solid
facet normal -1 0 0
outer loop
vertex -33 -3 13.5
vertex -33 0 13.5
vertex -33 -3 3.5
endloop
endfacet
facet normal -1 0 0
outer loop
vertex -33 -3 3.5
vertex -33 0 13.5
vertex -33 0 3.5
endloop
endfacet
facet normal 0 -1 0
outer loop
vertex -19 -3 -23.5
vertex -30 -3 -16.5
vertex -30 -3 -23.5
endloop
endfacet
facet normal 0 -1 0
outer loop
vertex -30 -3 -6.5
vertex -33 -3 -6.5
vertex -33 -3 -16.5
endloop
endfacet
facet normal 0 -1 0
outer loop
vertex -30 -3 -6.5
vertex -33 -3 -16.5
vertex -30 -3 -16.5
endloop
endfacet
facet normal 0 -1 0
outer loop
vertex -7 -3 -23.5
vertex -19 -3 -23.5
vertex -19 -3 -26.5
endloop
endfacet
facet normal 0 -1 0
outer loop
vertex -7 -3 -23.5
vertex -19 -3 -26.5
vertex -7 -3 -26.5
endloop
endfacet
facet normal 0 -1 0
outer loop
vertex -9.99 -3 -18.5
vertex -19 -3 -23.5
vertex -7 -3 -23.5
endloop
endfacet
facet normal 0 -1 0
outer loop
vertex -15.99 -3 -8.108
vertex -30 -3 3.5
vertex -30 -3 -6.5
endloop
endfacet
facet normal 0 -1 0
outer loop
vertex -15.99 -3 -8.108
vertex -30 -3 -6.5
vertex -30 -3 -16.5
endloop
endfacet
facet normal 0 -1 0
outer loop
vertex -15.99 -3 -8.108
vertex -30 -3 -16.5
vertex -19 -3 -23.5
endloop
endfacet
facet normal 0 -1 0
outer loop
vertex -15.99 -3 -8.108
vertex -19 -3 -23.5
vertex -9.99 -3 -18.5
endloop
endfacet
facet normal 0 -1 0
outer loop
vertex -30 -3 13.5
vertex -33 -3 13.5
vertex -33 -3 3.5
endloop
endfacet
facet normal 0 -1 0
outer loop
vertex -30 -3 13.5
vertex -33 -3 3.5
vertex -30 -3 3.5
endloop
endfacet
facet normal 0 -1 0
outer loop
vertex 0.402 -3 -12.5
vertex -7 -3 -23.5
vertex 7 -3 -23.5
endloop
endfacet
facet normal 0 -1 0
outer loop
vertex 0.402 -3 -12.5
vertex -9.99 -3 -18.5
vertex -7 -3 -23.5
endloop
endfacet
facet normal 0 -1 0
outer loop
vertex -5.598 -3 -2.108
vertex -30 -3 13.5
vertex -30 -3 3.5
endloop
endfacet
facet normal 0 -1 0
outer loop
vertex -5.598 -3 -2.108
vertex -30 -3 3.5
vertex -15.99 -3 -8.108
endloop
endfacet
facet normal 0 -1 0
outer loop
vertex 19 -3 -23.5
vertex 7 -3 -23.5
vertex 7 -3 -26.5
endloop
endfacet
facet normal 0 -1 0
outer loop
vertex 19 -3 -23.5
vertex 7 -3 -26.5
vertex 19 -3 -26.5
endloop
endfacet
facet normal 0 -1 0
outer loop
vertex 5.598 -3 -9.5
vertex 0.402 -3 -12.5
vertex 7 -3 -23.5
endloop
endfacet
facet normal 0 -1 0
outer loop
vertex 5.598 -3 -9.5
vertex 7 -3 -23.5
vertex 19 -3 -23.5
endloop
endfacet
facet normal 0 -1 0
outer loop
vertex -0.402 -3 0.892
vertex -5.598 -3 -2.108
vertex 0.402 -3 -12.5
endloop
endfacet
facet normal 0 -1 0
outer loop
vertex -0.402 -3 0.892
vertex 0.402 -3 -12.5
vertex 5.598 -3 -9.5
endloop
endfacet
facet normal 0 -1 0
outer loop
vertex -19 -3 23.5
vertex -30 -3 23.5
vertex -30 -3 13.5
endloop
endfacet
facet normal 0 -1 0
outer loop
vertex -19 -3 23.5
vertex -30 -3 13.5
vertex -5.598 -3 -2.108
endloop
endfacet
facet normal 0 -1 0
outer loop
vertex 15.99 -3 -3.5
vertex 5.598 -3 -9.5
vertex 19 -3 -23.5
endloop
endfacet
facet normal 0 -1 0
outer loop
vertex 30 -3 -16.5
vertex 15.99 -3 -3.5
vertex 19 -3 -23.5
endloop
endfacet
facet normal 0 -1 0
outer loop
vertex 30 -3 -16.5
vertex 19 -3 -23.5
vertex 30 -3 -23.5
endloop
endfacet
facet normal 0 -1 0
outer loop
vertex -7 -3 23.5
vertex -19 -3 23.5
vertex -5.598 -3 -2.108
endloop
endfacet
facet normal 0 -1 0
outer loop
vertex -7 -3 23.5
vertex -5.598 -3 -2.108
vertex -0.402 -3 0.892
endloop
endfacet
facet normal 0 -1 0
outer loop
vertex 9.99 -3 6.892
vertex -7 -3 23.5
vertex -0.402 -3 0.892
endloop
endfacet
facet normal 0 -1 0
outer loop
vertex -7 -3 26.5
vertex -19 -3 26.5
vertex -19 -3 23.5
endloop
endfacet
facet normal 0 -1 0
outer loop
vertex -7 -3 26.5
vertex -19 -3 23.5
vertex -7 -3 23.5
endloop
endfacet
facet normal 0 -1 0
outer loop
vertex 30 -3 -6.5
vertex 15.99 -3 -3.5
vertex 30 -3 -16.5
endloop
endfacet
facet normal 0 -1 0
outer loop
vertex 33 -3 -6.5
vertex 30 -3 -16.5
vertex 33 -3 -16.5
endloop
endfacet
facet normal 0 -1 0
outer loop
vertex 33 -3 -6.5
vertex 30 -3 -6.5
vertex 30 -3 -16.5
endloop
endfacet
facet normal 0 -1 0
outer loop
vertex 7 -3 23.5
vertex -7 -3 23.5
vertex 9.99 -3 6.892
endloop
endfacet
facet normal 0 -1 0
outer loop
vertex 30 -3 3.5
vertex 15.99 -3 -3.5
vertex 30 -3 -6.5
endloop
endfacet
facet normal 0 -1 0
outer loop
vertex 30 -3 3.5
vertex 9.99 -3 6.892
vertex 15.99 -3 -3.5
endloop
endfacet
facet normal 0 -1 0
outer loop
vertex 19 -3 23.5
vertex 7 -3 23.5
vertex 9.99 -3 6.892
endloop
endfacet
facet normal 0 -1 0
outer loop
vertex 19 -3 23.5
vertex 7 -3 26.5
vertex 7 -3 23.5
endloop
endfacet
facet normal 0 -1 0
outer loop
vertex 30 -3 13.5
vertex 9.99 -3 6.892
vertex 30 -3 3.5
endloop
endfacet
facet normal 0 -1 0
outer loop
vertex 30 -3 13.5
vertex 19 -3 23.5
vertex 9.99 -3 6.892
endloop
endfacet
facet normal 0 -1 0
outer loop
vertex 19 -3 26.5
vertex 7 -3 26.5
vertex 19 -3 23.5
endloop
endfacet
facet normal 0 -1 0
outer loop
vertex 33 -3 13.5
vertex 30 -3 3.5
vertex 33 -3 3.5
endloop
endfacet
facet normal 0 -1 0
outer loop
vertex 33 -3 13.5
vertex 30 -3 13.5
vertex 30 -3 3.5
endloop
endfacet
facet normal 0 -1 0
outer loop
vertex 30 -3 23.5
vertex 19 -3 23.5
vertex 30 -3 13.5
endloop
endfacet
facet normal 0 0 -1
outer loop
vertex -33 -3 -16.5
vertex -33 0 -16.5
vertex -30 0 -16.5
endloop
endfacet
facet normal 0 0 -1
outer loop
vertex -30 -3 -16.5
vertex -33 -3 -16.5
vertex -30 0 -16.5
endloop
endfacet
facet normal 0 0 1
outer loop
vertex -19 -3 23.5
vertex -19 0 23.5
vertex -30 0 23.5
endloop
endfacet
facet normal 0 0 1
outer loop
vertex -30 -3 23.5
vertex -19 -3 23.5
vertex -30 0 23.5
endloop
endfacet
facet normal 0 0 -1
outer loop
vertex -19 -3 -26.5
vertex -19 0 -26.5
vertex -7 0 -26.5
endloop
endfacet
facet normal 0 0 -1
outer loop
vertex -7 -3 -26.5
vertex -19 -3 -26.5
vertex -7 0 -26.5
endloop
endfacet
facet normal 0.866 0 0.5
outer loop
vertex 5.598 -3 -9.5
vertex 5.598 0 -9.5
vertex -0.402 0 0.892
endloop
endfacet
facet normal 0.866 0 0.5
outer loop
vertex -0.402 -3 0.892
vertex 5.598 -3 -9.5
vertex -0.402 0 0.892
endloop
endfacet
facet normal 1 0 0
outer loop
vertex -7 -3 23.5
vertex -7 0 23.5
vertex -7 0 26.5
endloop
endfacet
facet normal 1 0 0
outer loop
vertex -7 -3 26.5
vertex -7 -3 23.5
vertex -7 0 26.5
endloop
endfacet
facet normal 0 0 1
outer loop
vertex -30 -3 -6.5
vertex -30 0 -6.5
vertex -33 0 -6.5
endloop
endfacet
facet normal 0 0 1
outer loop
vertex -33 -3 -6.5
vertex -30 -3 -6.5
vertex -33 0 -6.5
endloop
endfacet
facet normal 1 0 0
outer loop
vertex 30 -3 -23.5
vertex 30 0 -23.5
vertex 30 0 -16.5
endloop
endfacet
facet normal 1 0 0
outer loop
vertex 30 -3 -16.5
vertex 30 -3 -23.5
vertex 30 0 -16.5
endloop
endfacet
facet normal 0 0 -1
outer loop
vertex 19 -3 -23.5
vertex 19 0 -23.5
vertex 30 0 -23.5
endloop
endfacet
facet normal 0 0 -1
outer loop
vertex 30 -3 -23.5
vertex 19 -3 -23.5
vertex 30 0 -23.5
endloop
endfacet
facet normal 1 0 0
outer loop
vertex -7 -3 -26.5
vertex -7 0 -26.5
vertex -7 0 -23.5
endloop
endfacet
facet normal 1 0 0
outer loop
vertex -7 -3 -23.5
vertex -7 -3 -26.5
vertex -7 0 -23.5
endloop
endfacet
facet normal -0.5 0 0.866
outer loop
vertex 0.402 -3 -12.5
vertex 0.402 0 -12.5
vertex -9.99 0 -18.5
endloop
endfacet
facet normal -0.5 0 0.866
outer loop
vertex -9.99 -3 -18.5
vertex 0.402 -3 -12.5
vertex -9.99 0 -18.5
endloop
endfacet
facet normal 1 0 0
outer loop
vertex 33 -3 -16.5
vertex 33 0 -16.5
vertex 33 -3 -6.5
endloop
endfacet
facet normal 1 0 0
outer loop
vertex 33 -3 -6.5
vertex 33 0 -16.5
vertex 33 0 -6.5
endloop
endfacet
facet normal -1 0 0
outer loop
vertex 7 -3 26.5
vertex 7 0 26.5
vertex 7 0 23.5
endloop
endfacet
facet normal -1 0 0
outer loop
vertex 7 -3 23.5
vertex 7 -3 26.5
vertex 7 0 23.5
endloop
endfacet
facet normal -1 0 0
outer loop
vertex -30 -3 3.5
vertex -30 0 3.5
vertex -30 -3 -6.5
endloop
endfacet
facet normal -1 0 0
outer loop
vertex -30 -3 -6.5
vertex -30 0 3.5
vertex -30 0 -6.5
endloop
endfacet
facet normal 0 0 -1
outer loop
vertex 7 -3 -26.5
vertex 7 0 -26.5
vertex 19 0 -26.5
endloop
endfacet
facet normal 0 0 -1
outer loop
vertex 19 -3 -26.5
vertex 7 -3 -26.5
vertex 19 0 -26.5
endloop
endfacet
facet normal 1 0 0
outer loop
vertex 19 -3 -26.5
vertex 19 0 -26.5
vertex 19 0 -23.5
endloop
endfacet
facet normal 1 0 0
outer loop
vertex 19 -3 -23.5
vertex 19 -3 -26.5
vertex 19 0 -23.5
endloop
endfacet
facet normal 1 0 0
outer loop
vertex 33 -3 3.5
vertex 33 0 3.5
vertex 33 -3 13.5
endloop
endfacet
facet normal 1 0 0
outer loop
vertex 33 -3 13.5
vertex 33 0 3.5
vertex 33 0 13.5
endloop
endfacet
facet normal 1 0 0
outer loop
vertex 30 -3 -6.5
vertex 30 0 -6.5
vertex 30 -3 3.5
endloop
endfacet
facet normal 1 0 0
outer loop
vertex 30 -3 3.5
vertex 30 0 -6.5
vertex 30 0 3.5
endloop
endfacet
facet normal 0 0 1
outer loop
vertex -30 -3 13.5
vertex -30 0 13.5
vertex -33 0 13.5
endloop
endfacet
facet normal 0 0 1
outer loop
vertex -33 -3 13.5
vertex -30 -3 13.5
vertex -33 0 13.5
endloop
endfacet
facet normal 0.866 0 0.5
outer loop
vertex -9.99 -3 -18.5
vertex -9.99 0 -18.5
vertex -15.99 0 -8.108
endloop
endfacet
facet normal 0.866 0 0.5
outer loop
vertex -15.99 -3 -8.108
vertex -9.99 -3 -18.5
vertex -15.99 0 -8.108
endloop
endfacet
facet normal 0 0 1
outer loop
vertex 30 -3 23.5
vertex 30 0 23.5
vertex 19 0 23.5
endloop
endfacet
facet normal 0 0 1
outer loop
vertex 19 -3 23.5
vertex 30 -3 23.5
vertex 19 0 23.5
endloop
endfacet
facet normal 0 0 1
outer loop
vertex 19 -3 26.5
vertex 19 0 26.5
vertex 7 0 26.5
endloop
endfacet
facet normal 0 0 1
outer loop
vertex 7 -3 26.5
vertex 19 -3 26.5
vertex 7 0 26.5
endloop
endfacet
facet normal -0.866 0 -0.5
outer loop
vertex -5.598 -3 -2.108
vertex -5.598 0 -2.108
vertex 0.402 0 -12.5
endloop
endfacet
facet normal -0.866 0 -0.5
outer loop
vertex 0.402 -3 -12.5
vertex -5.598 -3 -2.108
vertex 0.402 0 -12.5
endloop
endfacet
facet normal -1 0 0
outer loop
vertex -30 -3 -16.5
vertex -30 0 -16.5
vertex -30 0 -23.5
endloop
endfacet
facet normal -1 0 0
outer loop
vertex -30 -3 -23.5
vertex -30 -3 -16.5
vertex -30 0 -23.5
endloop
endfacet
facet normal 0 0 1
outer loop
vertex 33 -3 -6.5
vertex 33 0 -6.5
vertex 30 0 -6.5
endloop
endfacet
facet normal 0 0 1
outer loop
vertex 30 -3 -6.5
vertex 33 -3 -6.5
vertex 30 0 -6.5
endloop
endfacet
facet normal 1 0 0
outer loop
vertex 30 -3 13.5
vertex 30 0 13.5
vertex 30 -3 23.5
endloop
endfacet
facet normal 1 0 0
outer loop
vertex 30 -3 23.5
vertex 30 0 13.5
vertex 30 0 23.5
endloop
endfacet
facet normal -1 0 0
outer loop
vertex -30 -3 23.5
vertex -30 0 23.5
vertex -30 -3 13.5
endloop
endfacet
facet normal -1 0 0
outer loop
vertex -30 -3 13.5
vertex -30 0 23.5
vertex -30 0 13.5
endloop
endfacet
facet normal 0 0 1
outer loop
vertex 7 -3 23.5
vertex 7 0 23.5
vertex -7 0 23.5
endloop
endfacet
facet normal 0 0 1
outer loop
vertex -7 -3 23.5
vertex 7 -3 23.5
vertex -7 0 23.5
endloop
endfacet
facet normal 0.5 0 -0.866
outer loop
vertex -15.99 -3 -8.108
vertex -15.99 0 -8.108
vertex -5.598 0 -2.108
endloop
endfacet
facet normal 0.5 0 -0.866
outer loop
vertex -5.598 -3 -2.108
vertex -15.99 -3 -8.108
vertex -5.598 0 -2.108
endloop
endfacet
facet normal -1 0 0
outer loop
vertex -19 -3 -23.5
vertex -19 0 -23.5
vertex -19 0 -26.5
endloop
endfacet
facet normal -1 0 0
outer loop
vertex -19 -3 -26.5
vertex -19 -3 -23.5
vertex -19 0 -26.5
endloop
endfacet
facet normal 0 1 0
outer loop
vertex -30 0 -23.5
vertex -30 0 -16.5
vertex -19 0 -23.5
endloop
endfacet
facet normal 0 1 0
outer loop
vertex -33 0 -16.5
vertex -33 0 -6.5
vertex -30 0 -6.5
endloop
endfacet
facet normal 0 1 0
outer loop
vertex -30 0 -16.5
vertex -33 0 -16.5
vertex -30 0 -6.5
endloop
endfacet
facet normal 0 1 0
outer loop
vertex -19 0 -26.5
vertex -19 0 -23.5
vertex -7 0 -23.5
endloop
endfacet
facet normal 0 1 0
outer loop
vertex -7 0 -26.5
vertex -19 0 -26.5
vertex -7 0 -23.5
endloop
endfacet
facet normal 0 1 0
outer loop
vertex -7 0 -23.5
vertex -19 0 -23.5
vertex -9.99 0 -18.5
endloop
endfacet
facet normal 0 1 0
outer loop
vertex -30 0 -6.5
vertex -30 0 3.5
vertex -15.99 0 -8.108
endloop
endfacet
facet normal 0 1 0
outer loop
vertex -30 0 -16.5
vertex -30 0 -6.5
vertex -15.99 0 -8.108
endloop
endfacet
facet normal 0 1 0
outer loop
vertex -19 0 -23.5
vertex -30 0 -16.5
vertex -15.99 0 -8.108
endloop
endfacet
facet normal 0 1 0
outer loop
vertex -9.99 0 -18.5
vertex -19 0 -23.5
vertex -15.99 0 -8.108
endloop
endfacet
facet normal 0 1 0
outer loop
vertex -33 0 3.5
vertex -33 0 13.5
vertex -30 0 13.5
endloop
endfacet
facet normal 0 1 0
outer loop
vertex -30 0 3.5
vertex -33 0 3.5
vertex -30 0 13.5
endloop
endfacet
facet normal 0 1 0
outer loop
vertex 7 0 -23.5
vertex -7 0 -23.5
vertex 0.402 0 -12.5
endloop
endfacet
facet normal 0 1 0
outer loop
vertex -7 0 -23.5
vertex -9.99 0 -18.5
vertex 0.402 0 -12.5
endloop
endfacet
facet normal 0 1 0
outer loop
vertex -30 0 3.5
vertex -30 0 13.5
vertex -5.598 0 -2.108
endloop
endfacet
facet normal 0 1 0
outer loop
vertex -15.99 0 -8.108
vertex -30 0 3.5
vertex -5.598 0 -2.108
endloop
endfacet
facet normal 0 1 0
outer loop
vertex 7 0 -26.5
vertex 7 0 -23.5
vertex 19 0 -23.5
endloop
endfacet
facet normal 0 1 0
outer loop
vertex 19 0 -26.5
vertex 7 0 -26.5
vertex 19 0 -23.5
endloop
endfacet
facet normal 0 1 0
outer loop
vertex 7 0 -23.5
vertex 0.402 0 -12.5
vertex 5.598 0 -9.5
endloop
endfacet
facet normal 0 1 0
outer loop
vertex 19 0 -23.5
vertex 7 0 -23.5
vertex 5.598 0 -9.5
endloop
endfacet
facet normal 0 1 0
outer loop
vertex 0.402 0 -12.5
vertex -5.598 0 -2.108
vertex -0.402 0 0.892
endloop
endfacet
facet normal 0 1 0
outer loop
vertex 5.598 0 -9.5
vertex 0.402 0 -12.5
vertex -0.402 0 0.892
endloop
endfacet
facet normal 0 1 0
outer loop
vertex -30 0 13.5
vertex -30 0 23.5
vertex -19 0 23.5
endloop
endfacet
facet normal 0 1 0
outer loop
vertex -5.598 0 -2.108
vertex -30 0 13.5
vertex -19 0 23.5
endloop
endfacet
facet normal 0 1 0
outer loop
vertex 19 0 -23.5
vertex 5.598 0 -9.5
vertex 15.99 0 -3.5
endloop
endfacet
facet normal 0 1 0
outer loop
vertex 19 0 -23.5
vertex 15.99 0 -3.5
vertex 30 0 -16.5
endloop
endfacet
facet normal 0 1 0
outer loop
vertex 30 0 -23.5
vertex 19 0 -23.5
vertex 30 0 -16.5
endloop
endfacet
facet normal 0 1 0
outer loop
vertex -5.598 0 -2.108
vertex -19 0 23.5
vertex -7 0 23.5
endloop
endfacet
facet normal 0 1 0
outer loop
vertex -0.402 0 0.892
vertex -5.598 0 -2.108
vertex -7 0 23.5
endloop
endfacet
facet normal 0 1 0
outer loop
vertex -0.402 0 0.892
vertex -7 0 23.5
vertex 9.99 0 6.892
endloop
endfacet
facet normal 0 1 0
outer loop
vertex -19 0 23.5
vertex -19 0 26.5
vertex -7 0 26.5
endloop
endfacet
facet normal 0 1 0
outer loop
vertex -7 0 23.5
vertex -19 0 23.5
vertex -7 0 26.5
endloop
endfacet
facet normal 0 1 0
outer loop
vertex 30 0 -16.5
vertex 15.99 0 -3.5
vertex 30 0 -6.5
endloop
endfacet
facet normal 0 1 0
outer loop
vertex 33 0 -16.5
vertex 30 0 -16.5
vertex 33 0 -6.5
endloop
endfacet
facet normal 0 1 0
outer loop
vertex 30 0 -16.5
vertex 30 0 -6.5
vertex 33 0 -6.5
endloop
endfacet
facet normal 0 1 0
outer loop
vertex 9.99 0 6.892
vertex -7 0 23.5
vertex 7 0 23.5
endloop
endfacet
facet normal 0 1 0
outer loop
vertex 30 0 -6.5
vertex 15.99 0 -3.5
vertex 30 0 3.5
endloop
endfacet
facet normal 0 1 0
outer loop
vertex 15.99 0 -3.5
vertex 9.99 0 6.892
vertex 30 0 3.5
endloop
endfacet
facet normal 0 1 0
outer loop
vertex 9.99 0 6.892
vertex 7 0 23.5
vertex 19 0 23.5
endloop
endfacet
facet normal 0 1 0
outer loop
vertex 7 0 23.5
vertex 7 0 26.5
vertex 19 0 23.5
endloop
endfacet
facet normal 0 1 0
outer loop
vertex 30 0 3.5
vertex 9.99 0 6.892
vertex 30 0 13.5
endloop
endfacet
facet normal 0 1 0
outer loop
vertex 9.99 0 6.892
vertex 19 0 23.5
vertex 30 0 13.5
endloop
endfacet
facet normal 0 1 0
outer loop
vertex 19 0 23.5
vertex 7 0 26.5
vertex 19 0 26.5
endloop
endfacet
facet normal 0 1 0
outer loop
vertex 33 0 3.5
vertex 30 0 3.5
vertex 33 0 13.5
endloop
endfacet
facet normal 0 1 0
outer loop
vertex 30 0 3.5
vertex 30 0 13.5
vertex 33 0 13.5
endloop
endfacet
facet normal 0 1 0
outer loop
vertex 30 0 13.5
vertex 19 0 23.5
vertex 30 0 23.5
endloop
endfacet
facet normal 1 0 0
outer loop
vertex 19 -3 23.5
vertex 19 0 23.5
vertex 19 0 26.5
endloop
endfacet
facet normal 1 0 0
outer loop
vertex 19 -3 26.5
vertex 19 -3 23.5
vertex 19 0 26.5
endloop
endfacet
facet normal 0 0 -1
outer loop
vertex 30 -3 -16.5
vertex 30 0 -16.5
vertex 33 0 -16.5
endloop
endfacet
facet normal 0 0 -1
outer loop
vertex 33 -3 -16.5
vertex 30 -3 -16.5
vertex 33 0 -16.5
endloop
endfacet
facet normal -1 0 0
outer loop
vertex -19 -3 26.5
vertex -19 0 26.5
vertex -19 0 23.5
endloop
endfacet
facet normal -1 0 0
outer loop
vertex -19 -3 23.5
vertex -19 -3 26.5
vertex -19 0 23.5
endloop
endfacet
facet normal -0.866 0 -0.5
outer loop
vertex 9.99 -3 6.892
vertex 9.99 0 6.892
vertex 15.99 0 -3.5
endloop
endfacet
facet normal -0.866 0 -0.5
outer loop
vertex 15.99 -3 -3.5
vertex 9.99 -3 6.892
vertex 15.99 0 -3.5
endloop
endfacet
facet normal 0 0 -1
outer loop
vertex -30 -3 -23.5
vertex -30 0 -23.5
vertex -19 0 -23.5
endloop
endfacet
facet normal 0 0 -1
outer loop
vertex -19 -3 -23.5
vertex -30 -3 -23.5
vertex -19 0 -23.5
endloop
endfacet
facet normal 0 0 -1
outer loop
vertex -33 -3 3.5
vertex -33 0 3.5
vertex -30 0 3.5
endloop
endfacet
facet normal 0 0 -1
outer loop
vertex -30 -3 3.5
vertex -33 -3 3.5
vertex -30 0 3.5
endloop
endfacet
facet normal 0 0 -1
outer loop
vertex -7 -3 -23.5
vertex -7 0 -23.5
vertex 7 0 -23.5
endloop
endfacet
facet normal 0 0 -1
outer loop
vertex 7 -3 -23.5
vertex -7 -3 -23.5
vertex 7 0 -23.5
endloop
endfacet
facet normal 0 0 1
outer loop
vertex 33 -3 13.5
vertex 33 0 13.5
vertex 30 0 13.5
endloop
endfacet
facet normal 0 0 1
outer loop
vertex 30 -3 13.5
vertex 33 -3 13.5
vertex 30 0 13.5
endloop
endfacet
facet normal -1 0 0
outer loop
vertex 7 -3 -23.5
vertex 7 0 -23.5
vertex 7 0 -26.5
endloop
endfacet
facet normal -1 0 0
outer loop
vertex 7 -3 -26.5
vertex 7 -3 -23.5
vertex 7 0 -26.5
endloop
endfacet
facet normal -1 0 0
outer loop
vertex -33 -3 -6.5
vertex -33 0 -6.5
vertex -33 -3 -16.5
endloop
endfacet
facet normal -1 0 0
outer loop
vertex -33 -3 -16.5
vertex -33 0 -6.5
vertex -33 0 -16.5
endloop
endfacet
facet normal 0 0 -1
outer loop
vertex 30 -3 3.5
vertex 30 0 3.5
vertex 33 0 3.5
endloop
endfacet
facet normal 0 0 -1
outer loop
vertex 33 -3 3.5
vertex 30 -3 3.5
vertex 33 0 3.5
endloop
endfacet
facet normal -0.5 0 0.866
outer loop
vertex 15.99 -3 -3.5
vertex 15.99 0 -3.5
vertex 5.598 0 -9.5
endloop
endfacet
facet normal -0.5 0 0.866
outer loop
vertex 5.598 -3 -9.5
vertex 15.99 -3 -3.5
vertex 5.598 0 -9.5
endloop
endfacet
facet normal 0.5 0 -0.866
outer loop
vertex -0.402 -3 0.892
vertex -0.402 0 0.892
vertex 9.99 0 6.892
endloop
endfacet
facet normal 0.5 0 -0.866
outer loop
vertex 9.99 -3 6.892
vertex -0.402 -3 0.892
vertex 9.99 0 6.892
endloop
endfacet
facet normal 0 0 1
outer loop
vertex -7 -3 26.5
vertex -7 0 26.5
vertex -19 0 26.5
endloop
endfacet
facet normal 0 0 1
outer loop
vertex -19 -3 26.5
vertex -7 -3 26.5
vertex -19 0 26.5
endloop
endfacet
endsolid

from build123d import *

# Parameters (mm, degrees)
F1_DEPTH = 3


# Not quite as in the source:
# - a feature names something its author has since deleted; it is built from what else it names


with BuildPart() as f1:
    # F0 (on Front) → F1 (new body)
    with BuildSketch(Plane.XZ):
        Polygon((-19, 26.5), (-19, 23.5), (-30, 23.5), (-30, 13.5), (-33, 13.5), (-33, 3.5), (-30, 3.5), (-30, -6.5), (-33, -6.5), (-33, -16.5), (-30, -16.5), (-30, -23.5), (-19, -23.5), (-19, -26.5), (-7, -26.5), (-7, -23.5), (7, -23.5), (7, -26.5), (19, -26.5), (19, -23.5), (30, -23.5), (30, -16.5), (33, -16.5), (33, -6.5), (30, -6.5), (30, 3.5), (33, 3.5), (33, 13.5), (30, 13.5), (30, 23.5), (19, 23.5), (19, 26.5), (7, 26.5), (7, 23.5), (-7, 23.5), (-7, 26.5), align=None)
        Polygon((0.4019237886, -12.5), (-9.9903810568, -18.5), (-15.9903810568, -8.1076951546), (-5.5980762114, -2.1076951546), align=None, mode=Mode.SUBTRACT)
        Polygon((-0.4019237886, 0.8923048454), (9.9903810568, 6.8923048454), (15.9903810568, -3.5), (5.5980762114, -9.5), align=None, mode=Mode.SUBTRACT)
    extrude(amount=F1_DEPTH)


solid = f1.part
